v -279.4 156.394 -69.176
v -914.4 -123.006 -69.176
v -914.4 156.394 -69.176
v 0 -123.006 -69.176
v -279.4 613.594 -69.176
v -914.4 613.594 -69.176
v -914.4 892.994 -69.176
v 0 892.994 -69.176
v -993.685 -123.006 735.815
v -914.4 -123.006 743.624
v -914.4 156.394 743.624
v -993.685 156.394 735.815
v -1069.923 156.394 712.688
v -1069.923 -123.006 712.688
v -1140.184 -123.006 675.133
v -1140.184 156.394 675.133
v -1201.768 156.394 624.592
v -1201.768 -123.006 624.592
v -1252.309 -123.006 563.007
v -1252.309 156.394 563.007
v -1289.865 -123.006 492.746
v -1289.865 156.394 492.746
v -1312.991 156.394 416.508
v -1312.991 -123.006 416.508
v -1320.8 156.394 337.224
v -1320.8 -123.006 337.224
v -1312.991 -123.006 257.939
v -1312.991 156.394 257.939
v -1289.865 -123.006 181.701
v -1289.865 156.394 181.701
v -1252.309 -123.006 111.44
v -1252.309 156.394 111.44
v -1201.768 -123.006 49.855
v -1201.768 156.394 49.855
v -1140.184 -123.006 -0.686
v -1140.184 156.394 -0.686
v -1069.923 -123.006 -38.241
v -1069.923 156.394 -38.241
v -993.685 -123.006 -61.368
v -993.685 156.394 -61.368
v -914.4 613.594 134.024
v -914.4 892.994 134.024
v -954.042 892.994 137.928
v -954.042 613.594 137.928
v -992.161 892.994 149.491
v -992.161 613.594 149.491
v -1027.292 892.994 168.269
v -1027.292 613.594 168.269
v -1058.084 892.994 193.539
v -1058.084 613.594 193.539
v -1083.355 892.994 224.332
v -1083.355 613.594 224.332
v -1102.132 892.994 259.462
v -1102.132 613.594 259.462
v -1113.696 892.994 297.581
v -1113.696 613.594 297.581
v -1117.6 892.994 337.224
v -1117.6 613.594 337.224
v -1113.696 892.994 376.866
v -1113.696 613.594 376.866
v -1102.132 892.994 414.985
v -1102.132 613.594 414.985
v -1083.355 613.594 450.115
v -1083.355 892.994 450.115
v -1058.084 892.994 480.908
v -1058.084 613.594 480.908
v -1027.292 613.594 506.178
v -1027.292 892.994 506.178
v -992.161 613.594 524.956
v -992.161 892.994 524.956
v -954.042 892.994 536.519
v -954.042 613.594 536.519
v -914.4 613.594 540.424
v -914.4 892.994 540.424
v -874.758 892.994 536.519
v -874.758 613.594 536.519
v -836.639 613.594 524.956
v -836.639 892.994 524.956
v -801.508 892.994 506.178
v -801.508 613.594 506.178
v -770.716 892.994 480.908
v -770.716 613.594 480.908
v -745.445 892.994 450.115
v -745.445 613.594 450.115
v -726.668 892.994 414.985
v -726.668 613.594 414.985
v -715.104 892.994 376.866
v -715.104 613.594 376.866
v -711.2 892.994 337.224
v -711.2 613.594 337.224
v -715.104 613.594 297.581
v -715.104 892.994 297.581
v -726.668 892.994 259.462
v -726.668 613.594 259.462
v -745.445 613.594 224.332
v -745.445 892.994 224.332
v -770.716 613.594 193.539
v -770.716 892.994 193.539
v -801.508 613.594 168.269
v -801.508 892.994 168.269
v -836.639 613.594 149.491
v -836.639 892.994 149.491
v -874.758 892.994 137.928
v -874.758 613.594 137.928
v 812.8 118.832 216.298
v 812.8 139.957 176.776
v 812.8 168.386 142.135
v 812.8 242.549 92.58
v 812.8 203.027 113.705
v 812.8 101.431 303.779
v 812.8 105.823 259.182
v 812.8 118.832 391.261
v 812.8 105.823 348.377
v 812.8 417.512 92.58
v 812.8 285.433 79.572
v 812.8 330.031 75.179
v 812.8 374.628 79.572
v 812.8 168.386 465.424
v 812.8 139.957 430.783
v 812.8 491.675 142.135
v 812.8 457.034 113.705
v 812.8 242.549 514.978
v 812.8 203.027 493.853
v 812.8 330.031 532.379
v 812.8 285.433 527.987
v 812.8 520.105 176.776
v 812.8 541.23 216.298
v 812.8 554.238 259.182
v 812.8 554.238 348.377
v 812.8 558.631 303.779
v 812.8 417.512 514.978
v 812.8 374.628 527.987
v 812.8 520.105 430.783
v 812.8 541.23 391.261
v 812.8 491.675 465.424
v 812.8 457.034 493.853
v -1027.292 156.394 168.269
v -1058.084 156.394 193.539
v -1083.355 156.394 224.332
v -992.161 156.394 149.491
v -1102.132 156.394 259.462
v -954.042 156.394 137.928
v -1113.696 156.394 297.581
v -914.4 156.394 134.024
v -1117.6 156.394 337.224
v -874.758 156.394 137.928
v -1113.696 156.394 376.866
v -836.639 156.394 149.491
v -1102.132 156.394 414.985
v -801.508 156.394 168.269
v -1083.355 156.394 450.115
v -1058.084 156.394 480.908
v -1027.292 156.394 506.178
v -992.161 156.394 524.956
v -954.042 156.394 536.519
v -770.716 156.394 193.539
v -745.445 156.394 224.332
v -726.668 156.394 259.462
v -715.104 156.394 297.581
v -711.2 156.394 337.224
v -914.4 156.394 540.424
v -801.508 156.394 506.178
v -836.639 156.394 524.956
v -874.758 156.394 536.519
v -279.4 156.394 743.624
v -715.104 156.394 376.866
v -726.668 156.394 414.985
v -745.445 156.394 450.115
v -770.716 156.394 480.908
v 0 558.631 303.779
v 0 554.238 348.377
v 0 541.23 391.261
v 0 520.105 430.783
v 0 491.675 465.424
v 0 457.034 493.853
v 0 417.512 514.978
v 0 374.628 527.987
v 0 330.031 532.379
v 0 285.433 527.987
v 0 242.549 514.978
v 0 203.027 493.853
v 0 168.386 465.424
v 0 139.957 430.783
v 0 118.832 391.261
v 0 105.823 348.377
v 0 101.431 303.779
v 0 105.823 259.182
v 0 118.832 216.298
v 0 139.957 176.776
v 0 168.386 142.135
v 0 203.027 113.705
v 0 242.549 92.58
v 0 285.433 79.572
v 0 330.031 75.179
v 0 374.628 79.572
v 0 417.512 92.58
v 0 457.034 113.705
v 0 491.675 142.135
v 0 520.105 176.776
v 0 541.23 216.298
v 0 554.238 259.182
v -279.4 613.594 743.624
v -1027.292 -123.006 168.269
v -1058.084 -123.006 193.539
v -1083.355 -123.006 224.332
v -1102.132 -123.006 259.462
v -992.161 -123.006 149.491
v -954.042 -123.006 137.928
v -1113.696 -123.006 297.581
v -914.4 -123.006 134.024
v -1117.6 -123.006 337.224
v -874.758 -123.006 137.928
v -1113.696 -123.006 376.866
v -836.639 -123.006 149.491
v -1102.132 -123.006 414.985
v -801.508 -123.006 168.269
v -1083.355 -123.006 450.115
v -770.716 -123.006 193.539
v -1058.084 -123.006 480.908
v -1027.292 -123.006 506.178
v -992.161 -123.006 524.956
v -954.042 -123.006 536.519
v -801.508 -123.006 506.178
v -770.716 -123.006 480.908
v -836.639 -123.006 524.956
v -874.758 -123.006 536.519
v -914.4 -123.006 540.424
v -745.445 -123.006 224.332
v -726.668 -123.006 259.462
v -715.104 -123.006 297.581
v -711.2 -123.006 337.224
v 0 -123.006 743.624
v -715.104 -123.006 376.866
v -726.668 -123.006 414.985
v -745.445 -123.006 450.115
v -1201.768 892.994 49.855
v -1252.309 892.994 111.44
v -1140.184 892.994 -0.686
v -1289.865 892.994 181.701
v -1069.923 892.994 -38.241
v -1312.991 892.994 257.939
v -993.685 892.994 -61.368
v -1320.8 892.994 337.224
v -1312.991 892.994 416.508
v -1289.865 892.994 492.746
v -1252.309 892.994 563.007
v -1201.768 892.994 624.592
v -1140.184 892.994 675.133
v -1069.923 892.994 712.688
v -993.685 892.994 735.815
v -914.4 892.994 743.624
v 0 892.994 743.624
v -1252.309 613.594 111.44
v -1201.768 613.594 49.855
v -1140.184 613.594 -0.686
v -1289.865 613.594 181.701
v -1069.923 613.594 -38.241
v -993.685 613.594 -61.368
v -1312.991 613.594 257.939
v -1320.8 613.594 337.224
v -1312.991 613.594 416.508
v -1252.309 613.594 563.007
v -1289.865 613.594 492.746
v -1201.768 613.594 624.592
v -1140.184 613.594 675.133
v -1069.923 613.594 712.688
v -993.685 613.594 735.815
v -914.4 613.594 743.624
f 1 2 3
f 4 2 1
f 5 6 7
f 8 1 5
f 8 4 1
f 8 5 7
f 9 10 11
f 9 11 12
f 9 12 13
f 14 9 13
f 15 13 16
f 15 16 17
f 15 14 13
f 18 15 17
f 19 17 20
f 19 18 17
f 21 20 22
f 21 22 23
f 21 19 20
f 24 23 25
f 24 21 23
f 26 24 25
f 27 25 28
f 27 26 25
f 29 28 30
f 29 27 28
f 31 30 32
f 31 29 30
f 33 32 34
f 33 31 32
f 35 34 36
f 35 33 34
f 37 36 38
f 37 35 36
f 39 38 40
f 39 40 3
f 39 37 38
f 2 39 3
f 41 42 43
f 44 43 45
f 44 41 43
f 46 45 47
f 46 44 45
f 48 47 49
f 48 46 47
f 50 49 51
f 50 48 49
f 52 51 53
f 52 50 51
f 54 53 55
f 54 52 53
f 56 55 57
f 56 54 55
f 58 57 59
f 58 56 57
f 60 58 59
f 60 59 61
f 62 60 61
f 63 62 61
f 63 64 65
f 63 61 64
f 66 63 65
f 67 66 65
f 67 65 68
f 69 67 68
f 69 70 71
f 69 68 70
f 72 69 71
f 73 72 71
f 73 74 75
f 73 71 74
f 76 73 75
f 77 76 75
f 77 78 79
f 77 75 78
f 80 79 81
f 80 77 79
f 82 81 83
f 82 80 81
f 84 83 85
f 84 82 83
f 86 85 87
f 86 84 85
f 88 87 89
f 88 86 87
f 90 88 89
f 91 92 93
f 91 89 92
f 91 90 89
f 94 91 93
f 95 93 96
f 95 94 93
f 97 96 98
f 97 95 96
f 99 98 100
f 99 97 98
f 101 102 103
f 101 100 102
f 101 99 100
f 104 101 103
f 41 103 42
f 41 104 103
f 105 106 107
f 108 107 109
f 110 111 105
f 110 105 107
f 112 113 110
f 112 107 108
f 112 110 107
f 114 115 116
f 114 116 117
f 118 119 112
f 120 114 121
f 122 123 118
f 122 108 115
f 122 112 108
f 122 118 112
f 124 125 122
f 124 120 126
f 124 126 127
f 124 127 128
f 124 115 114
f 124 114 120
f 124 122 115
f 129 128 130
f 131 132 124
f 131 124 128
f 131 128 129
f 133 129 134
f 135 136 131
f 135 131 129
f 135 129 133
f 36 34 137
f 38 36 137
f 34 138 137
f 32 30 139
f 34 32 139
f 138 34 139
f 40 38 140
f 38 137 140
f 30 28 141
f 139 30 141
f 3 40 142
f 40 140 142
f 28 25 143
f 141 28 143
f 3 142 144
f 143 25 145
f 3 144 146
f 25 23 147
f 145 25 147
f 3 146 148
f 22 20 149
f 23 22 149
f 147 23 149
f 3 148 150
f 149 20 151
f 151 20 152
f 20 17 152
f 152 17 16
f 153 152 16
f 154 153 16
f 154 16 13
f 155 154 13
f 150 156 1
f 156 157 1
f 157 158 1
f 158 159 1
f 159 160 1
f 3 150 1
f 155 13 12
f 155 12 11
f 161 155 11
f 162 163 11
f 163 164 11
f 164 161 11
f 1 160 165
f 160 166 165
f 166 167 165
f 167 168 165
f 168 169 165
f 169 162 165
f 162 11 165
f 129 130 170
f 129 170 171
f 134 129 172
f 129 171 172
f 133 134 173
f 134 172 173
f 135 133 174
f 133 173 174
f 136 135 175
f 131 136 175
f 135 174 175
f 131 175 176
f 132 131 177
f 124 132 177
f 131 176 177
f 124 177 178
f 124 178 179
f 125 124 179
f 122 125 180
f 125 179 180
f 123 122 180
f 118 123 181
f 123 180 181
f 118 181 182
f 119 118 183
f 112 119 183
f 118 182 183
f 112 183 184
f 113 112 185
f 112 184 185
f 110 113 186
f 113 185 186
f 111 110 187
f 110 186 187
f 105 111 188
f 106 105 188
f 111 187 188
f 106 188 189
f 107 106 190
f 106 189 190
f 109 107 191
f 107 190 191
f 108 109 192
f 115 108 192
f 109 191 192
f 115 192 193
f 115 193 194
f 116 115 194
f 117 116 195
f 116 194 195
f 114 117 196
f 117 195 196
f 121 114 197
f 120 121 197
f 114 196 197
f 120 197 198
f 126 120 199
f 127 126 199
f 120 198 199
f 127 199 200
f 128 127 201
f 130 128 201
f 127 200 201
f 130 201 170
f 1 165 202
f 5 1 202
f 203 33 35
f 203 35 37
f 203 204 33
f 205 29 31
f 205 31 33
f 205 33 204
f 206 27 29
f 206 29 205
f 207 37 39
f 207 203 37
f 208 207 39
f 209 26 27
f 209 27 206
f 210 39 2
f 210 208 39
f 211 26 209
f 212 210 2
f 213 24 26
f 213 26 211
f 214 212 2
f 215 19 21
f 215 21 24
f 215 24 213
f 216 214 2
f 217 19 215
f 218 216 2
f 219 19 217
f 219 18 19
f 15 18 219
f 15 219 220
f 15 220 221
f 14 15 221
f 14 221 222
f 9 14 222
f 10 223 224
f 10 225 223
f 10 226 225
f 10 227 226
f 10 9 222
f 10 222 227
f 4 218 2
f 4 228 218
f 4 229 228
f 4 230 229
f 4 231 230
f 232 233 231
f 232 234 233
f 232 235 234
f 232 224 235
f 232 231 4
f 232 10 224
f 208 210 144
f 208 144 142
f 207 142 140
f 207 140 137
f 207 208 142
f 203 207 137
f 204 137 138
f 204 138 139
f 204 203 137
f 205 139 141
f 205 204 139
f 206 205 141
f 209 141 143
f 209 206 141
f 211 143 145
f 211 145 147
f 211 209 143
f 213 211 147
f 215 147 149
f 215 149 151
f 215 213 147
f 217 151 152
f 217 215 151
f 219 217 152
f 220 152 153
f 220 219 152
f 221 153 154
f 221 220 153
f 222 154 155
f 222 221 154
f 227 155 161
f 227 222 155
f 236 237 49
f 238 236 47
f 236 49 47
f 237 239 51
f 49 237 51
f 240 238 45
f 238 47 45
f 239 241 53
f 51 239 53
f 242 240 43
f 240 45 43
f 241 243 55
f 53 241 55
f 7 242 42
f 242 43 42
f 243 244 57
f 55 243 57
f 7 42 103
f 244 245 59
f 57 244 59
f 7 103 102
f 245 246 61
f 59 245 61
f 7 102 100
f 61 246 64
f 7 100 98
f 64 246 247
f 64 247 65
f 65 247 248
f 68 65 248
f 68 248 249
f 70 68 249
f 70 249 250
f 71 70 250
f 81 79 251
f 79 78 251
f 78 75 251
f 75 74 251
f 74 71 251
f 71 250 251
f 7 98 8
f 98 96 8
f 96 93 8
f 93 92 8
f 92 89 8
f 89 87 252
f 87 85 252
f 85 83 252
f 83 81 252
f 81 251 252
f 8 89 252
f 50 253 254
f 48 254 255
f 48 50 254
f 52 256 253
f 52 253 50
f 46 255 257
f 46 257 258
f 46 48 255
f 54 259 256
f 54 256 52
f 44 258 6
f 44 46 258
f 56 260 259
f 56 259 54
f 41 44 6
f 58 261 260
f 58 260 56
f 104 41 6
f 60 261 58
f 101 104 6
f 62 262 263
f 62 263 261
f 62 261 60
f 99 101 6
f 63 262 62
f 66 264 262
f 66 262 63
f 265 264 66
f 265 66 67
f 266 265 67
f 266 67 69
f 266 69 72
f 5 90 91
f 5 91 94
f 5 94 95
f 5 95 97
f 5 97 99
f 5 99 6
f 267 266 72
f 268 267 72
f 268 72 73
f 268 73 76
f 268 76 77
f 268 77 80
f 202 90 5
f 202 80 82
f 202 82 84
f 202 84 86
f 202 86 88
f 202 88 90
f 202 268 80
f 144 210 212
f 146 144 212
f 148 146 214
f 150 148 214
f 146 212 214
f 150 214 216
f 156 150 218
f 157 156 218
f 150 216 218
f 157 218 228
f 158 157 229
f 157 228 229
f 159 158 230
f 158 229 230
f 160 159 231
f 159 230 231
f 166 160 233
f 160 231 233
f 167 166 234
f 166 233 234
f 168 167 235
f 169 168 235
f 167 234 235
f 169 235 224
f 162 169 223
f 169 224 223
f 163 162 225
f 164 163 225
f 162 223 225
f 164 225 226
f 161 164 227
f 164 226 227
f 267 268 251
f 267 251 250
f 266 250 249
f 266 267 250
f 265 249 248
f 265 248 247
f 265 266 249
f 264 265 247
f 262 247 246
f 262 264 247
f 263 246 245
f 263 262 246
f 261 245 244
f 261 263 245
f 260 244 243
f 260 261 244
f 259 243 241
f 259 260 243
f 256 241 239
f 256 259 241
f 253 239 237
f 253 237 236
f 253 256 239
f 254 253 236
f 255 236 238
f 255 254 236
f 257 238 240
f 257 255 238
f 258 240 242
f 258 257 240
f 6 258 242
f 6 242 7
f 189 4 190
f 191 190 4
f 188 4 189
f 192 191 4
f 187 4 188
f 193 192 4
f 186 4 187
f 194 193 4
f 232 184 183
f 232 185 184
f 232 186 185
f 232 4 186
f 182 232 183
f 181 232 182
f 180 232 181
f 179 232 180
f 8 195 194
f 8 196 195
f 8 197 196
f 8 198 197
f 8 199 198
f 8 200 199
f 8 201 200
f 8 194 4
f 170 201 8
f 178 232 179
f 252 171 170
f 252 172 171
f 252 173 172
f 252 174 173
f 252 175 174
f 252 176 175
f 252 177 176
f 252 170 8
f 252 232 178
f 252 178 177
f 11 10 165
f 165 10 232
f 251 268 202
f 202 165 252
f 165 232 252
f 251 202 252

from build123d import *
from build123d import SkipClean  # not in build123d's __all__

# Parameters (mm, degrees)
F0_R      = 228.6
F1_DEPTH  = 812.8
F0_W      = 1016
F0_H      = 812.8
F1_FACE_R = 228.6
F2_DEPTH  = 914.4
F4_DEPTH  = 279.4
F6_DEPTH  = 1016.001
F7_W      = 635
F7_H      = 457.2
F8_DEPTH  = 812.801
F10_DEPTH = 279.4


# Not quite as in the source:
# - after a boolean that leaves OpenCascade's solid faulty, fix() repairs it


with BuildPart() as f1:
    # F0 (on Right) → F1 (new body)
    with BuildSketch(Plane.YZ):
        with Locations((330.030798912, 303.7791848183)):
            Circle(F0_R)
    extrude(amount=F1_DEPTH)

    # F0 (on Right) + F1_face (on face) → F2 (join)
    with BuildSketch(Plane.YZ):
        with Locations((384.9944980741, 337.2235123754)):
            Rectangle(F0_W, F0_H)
        with Locations((330.030798912, 303.7791848183)):
            Circle(F0_R, mode=Mode.SUBTRACT)
    with BuildSketch(Plane(origin=(0, 330.030798912, 303.7791848183), x_dir=(0, 1, 0), z_dir=(-1, 0, 0))):
        Circle(F1_FACE_R)
    extrude(amount=-F2_DEPTH, dir=(1, 0, 0))

    # F3 (on face) → F4 (join)
    with BuildSketch(Plane.XZ.offset(123.0055019259)):
        with BuildLine():
            ThreePointArc((-914.4, 743.6235123754), (-1320.8, 337.2235123754), (-914.4, -69.1764876246))
            Line((-914.4, -69.1764876246), (-914.4, 134.0235123754))
            ThreePointArc((-914.4, 134.0235123754), (-1117.6, 337.2235123754), (-914.4, 540.4235123754))
            Line((-914.4, 540.4235123754), (-914.4, 743.6235123754))
        make_face()
    extrude(amount=-F4_DEPTH)

    # F5 (on face) → F6 (cut, through all)
    with BuildSketch(Plane.XZ.offset(123.0055019259)):
        with BuildLine():
            Line((-914.4, 540.4235123754), (-914.4, 134.0235123754))
            ThreePointArc((-914.4, 134.0235123754), (-770.7159020629, 193.5394144382), (-711.2, 337.2235123754))
            ThreePointArc((-711.2, 337.2235123754), (-770.7159020629, 480.9076103125), (-914.4, 540.4235123754))
        make_face()
    with SkipClean():  # cleaning this boolean's faces spoils the solid; the shape is the same uncleaned
        extrude(amount=-F6_DEPTH, mode=Mode.SUBTRACT)

    # F7 (on face) → F8 (cut, through all)
    with BuildSketch(Plane.XY.offset(743.6235123754)):
        with Locations((-596.9, 384.9944980741)):
            Rectangle(F7_W, F7_H)
    extrude(amount=-F8_DEPTH, mode=Mode.SUBTRACT)

    add(f1.part.fix(), mode=Mode.REPLACE)

    # F9 (on face) → F10 (join)
    with BuildSketch(Plane.XZ.offset(-613.5944980741)):
        with BuildLine():
            Line((-914.4, 540.4235123754), (-914.4, 743.6235123754))
            ThreePointArc((-914.4, 743.6235123754), (-1320.8, 337.2235123754), (-914.4, -69.1764876246))
            Line((-914.4, -69.1764876246), (-914.4, 134.0235123754))
            ThreePointArc((-914.4, 134.0235123754), (-1117.6, 337.2235123754), (-914.4, 540.4235123754))
        make_face()
    extrude(amount=-F10_DEPTH)


solid = f1.part
